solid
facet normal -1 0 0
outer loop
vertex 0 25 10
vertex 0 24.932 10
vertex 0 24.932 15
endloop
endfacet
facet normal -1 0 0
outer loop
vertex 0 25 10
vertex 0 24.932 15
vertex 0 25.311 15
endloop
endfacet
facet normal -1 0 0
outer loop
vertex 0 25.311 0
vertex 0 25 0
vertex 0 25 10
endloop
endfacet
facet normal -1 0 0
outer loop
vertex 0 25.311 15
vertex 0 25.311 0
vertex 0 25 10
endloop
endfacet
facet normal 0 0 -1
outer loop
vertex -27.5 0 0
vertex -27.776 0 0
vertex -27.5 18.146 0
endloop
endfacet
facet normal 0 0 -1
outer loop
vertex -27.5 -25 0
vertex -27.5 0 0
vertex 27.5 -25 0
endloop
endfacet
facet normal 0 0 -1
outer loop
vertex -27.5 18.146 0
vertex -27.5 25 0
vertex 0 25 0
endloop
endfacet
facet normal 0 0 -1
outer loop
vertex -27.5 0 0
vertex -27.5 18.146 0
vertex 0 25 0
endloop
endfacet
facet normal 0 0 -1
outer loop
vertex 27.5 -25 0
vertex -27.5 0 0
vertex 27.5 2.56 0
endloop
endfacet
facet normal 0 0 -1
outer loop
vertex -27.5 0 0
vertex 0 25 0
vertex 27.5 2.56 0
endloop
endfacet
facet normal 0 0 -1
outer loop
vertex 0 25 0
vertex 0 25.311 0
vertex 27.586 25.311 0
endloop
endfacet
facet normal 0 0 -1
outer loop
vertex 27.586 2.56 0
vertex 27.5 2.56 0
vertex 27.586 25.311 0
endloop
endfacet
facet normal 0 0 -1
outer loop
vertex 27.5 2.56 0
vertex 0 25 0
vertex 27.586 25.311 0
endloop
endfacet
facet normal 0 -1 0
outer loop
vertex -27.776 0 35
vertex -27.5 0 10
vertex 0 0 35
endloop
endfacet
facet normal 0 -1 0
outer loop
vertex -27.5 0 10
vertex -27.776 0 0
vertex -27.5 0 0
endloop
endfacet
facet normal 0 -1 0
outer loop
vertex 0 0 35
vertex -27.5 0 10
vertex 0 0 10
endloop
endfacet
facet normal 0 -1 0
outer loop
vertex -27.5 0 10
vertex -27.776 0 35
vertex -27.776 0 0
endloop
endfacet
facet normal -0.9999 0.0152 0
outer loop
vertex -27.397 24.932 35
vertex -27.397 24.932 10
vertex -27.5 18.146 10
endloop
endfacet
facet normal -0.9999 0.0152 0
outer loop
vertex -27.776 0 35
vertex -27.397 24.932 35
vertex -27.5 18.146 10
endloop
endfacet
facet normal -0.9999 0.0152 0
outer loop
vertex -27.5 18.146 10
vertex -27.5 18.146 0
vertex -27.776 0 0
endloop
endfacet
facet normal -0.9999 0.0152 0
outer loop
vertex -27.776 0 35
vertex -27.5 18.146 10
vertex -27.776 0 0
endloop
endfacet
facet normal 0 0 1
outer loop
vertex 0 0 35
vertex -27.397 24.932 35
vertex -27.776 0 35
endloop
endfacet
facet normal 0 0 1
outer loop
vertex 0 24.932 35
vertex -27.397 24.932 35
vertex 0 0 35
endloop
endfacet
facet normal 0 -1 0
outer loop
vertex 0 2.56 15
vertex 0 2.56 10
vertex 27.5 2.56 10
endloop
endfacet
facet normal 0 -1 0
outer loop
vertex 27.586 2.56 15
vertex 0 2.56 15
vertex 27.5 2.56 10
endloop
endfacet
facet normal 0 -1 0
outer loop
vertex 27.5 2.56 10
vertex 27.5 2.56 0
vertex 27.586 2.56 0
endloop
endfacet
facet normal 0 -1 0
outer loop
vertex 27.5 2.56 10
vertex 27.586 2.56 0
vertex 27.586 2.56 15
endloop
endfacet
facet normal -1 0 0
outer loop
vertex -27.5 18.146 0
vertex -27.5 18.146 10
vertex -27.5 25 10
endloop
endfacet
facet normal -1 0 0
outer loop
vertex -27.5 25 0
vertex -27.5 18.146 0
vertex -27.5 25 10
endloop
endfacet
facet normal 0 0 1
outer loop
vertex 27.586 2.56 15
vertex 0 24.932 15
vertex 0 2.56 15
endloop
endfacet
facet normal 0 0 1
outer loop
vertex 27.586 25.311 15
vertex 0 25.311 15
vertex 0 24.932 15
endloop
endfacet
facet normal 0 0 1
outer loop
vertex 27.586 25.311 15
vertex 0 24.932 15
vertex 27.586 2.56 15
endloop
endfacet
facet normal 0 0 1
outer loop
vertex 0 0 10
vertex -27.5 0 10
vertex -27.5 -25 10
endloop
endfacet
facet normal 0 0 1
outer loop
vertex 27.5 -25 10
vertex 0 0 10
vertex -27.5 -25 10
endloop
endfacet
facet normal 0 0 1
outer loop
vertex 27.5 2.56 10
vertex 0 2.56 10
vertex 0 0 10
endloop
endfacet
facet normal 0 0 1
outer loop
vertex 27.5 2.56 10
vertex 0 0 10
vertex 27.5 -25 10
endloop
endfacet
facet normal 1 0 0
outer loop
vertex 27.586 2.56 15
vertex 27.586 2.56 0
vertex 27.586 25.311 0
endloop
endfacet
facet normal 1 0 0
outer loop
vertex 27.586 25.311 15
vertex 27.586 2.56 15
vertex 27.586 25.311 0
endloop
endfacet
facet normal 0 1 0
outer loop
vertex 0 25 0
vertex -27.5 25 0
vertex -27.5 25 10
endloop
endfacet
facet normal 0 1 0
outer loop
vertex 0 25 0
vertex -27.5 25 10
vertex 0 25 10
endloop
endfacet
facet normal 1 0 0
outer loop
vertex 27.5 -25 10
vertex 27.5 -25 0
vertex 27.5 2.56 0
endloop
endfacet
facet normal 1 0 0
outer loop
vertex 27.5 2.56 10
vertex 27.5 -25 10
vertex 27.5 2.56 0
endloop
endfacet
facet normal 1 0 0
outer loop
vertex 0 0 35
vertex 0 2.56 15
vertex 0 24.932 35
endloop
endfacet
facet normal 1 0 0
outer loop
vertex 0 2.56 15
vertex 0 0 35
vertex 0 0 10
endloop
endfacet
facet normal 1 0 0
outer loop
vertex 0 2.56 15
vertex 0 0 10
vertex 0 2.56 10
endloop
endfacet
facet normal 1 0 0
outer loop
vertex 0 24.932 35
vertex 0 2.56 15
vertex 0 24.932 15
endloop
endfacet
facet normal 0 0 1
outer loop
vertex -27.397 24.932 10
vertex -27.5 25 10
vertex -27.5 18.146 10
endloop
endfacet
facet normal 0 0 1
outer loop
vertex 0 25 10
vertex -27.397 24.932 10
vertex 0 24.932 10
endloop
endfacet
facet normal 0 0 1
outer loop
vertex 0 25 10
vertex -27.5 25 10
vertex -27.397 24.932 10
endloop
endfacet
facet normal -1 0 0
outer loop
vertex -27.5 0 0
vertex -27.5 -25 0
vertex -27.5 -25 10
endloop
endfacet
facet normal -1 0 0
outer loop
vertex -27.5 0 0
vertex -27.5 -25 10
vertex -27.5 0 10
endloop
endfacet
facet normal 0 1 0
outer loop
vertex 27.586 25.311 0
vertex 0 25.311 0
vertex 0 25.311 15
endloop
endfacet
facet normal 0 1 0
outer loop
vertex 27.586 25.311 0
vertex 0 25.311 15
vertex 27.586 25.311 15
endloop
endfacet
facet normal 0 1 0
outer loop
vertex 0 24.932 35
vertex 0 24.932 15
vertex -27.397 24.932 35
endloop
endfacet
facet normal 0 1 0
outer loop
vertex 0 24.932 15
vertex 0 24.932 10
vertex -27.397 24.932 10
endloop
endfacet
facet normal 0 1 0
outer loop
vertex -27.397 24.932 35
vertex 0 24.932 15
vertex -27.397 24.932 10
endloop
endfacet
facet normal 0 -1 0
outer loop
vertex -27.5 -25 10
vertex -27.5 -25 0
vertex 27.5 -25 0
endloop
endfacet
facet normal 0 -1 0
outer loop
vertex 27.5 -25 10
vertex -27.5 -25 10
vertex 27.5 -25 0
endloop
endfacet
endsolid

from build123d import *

# Parameters (mm, degrees)
F0_W     = 55
F0_H     = 50
F1_DEPTH = 10
F3_DEPTH = 35
F4_W     = 27.586387
F4_H     = 22.751658
F5_DEPTH = 15


with BuildPart() as f1:
    # F0 (on Top) → F1 (new body)
    with BuildSketch(Plane.XY):
        Rectangle(F0_W, F0_H)
    extrude(amount=F1_DEPTH)

    # F2 (on Top) → F3 (join)
    with BuildSketch(Plane.XY):
        Polygon((-27.396789, 24.932027), (-27.775984, 0), (0, 0), (0, 24.932027), align=None)
    extrude(amount=F3_DEPTH)

    # F4 (on Top) → F5 (join)
    with BuildSketch(Plane.XY):
        with Locations((13.793193, 13.935391)):
            Rectangle(F4_W, F4_H)
    extrude(amount=F5_DEPTH)


solid = f1.part
